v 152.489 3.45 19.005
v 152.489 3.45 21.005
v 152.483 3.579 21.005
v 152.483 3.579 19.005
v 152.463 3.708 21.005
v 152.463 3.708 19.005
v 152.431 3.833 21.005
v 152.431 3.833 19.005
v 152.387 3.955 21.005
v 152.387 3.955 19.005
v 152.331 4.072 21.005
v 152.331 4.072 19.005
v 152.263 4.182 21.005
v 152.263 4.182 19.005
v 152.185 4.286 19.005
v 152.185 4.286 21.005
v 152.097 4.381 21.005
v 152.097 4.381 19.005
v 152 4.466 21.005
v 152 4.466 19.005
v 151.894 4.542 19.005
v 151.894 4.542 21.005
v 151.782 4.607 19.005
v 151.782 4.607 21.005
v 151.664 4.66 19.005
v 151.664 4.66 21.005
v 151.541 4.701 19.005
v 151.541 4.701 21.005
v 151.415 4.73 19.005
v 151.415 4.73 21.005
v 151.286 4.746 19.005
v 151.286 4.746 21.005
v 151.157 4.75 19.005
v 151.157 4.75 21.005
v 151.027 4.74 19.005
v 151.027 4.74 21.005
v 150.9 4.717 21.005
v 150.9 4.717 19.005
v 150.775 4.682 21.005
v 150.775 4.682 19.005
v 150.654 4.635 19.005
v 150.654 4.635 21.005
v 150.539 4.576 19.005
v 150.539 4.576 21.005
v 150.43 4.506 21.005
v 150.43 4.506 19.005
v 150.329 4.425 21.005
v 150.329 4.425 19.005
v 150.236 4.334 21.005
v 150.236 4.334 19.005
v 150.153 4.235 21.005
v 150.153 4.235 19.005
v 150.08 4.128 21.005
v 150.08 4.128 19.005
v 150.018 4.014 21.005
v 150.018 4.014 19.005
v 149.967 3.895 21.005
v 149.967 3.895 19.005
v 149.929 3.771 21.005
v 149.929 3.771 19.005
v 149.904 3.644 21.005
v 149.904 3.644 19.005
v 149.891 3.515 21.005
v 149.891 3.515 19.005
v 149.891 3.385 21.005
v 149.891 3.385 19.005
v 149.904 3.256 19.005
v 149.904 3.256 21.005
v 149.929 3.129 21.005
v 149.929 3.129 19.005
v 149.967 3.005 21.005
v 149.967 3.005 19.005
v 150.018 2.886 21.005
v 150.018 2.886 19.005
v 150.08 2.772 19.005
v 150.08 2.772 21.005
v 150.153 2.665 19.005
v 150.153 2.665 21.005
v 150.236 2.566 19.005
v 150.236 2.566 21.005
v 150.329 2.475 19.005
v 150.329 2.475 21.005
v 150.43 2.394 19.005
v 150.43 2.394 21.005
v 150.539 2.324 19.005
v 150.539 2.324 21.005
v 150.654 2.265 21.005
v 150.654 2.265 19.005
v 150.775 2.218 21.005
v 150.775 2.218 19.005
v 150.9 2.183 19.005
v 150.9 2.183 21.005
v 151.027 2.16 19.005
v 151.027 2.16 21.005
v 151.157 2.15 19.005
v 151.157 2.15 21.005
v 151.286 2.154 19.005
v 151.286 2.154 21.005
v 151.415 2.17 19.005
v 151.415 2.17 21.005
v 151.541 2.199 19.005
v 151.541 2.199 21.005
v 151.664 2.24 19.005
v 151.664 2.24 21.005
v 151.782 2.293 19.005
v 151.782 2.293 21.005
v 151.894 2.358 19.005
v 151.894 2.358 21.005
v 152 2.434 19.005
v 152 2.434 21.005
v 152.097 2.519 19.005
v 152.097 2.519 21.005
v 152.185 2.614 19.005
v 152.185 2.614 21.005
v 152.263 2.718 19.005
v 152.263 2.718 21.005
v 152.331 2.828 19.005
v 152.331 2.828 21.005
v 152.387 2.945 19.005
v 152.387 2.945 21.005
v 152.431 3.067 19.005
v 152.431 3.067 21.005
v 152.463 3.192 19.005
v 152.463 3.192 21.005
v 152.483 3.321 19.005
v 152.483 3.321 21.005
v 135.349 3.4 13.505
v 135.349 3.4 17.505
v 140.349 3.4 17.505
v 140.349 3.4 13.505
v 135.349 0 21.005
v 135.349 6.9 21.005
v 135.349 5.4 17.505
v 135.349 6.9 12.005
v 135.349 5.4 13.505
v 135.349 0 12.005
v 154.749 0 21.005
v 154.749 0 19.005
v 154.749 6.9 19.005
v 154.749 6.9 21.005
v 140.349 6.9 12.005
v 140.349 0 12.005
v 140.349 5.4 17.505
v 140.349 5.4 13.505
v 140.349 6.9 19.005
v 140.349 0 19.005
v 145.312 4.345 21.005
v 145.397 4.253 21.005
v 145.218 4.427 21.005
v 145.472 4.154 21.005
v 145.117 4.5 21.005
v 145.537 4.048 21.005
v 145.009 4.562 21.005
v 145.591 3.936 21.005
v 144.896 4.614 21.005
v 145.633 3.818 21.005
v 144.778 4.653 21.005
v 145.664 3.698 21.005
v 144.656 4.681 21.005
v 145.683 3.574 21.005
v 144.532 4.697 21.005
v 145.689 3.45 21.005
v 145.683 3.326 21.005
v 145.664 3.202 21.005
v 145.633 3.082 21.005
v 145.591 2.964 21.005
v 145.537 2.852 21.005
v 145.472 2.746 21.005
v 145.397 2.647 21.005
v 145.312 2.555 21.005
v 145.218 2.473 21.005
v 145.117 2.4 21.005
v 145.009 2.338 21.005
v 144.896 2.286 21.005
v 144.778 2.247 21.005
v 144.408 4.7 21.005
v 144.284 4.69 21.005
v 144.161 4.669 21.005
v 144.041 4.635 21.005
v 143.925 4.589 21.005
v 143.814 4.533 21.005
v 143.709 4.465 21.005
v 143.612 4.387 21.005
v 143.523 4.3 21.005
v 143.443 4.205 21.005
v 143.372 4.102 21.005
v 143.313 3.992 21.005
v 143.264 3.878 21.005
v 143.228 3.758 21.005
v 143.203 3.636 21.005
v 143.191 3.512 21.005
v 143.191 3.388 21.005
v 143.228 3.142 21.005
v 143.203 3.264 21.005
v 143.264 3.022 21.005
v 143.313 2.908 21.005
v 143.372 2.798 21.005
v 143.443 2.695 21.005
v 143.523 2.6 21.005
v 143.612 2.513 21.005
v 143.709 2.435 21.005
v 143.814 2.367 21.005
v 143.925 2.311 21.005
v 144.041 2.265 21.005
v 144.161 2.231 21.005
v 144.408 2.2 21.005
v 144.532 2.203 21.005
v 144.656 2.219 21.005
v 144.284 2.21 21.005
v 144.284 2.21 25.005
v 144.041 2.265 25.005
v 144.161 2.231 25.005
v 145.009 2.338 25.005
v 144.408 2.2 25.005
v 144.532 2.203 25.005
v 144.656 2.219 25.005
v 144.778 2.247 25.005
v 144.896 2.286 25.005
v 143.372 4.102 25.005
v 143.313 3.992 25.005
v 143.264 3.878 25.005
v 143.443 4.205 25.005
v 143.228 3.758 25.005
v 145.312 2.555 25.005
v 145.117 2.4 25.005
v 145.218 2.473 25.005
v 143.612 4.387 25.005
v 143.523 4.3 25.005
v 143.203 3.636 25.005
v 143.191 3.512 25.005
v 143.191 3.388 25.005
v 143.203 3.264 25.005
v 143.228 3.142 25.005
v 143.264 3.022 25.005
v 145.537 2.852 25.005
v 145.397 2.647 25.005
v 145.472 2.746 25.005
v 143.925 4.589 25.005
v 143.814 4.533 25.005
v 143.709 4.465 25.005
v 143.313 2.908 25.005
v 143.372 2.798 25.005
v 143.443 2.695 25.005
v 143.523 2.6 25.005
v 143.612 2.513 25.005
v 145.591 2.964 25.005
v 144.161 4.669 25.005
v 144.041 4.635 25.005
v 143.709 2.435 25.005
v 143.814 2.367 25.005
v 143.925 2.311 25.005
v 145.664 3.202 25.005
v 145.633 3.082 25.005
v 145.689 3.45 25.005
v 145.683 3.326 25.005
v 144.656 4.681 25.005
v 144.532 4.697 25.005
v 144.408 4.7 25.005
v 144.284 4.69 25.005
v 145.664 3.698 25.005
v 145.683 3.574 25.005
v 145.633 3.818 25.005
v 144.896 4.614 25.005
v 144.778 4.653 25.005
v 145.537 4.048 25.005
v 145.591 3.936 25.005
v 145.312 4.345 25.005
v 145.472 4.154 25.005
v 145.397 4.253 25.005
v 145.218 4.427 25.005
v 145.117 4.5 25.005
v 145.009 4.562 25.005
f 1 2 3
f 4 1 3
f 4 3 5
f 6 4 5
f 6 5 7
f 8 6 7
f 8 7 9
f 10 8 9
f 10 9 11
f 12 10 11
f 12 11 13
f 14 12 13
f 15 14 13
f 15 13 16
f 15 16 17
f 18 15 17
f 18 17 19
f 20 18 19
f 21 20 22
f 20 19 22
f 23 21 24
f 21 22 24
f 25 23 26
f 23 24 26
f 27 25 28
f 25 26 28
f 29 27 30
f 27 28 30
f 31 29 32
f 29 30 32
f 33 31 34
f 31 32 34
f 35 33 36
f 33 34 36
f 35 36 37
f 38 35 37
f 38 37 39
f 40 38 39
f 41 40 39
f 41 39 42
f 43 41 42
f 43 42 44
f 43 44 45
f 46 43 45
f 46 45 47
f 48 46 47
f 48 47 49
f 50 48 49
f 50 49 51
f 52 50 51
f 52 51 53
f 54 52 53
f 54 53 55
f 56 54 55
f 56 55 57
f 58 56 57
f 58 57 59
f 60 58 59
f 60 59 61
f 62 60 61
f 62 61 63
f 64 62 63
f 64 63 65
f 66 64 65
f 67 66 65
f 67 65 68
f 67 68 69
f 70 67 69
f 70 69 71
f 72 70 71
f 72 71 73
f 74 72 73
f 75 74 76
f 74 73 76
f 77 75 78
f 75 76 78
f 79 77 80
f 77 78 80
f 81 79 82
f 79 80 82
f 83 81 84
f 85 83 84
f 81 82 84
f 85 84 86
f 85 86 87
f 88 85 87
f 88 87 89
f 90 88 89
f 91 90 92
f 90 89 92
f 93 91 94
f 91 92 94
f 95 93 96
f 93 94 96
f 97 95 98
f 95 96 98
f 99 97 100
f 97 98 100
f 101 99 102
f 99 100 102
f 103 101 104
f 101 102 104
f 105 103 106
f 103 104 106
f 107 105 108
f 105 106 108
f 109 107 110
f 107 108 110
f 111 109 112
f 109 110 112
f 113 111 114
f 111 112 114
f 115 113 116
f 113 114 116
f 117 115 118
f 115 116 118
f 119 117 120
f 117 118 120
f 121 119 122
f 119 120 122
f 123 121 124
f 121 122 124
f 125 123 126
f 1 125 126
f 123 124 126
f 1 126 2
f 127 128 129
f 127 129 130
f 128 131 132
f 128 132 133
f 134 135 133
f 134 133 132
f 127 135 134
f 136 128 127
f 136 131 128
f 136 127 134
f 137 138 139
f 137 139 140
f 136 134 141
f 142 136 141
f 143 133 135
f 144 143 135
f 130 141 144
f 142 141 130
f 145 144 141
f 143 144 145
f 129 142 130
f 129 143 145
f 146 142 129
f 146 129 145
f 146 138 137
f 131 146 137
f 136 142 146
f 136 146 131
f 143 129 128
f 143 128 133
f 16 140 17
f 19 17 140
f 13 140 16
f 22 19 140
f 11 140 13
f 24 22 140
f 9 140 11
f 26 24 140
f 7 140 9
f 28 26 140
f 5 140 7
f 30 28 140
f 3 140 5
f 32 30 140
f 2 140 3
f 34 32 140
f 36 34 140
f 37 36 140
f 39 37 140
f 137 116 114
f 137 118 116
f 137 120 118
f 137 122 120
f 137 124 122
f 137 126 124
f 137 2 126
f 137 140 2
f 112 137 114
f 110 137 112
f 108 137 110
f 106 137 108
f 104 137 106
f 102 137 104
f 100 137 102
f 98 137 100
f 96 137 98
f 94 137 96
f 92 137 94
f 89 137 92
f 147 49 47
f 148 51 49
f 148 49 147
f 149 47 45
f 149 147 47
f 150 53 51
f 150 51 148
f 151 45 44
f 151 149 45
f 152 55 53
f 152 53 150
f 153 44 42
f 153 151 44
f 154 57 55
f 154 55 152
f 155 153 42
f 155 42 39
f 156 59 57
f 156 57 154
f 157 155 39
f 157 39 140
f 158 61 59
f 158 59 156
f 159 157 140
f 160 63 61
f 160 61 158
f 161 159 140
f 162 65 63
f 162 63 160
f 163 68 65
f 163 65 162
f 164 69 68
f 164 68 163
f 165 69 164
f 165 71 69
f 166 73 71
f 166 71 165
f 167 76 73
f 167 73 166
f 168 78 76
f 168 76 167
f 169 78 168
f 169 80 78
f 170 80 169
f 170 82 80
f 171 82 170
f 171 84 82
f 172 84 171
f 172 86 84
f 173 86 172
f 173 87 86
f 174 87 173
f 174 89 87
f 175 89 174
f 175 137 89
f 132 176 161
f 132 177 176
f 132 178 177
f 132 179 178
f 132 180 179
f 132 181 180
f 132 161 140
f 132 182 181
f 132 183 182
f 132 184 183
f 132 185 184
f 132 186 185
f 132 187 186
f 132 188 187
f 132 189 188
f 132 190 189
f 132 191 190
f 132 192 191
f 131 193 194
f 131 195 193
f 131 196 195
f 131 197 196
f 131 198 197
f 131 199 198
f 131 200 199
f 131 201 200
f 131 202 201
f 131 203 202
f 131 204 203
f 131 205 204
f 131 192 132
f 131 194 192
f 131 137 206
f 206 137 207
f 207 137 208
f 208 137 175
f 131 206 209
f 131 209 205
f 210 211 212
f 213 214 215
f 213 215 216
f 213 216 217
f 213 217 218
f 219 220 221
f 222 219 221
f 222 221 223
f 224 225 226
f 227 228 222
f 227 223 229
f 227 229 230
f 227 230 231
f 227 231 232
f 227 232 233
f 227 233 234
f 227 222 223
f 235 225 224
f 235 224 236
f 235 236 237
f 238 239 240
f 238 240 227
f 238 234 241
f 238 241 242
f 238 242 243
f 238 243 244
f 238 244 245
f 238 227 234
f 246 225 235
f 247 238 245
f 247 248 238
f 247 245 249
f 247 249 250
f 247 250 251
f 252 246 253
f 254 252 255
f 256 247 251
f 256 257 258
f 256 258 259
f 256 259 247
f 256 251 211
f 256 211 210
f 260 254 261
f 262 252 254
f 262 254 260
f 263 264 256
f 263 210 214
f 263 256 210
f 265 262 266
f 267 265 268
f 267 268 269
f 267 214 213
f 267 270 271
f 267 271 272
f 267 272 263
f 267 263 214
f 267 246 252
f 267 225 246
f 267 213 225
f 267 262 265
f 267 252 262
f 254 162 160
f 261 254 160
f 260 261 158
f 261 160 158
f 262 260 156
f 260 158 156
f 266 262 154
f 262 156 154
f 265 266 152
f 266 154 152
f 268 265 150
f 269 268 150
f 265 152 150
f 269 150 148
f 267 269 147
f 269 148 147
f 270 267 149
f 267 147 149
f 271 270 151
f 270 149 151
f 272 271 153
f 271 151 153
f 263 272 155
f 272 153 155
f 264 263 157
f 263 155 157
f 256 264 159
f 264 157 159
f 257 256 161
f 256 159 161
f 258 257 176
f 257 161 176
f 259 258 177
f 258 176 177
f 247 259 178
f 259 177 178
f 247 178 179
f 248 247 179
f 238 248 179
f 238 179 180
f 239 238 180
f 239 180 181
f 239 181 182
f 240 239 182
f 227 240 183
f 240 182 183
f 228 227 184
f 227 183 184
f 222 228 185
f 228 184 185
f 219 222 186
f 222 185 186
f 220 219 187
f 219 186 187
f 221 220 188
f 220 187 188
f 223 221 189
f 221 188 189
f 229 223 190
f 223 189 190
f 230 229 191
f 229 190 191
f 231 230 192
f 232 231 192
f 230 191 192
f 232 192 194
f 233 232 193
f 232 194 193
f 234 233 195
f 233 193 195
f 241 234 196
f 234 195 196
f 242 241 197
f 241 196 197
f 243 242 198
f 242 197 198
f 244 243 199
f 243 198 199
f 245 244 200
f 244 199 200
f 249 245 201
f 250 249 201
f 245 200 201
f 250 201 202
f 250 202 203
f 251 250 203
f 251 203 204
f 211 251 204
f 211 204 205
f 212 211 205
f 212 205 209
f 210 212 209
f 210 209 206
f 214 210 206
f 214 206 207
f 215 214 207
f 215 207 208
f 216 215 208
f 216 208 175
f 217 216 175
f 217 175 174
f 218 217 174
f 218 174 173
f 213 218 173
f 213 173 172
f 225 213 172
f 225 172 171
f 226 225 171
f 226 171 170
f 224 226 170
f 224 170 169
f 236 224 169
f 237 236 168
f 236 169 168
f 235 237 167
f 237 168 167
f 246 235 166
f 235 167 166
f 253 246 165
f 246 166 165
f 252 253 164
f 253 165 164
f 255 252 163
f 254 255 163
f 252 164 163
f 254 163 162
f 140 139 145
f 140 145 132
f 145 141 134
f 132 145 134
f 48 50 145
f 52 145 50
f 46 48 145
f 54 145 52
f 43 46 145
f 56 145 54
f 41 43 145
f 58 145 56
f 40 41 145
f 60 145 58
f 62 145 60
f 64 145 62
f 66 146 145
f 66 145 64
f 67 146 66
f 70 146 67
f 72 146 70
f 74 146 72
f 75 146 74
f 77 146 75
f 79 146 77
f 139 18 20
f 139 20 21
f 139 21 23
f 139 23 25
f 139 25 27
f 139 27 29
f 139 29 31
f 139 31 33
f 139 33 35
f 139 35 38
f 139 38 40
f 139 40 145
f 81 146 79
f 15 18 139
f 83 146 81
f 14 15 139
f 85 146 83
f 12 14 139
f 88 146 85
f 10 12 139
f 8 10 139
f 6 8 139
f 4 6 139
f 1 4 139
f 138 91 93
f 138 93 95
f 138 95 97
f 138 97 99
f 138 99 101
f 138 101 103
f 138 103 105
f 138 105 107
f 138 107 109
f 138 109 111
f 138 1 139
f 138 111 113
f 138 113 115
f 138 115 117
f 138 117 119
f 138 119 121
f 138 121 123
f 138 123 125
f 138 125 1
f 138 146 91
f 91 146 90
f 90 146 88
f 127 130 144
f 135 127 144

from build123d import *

# Parameters (mm, degrees)
BOSS_EXTRUDE1_DEPTH = 6.9
SKETCH2_R           = 1.3
CUT_EXTRUDE1_DEPTH  = 10
SKETCH3_R           = 1.25
BOSS_EXTRUDE2_DEPTH = 4
SKETCH4_W           = 4
SKETCH4_H           = 2
CUT_EXTRUDE2_DEPTH  = 6


with BuildPart() as part:
    # Sketch1 → Boss-Extrude1 (new body)
    with BuildSketch(Plane(origin=(0, 0, 0), x_dir=(1, 0, 0), z_dir=(0, 1, 0))):
        Polygon((154.749006664, -21.005499154), (135.349006664, -21.005499154), (135.349006664, -12.005499154), (140.349006664, -12.005499154), (140.349006664, -19.005499154), (154.749006664, -19.005499154), align=None)
    extrude(amount=BOSS_EXTRUDE1_DEPTH)

    # Sketch2 → Cut-Extrude1 (cut, through all)
    with BuildSketch(Plane.XY.offset(21.005499154)):
        with Locations((151.189006664, 3.45)):
            Circle(SKETCH2_R)
    extrude(amount=-CUT_EXTRUDE1_DEPTH, mode=Mode.SUBTRACT)

    # Sketch3 → Boss-Extrude2 (add)
    with BuildSketch(Plane.XY.offset(21.005499154)):
        with Locations((144.439006664, 3.45)):
            Circle(SKETCH3_R)
    extrude(amount=BOSS_EXTRUDE2_DEPTH)

    # Sketch4 → Cut-Extrude2 (cut, through all)
    with BuildSketch(Plane(origin=(140.349006664, 0, 0), x_dir=(0, 0, -1), z_dir=(1, 0, 0))):
        with Locations((-15.505499154, 4.4)):
            Rectangle(SKETCH4_W, SKETCH4_H)
    extrude(amount=-CUT_EXTRUDE2_DEPTH, mode=Mode.SUBTRACT)


solid = part.part
